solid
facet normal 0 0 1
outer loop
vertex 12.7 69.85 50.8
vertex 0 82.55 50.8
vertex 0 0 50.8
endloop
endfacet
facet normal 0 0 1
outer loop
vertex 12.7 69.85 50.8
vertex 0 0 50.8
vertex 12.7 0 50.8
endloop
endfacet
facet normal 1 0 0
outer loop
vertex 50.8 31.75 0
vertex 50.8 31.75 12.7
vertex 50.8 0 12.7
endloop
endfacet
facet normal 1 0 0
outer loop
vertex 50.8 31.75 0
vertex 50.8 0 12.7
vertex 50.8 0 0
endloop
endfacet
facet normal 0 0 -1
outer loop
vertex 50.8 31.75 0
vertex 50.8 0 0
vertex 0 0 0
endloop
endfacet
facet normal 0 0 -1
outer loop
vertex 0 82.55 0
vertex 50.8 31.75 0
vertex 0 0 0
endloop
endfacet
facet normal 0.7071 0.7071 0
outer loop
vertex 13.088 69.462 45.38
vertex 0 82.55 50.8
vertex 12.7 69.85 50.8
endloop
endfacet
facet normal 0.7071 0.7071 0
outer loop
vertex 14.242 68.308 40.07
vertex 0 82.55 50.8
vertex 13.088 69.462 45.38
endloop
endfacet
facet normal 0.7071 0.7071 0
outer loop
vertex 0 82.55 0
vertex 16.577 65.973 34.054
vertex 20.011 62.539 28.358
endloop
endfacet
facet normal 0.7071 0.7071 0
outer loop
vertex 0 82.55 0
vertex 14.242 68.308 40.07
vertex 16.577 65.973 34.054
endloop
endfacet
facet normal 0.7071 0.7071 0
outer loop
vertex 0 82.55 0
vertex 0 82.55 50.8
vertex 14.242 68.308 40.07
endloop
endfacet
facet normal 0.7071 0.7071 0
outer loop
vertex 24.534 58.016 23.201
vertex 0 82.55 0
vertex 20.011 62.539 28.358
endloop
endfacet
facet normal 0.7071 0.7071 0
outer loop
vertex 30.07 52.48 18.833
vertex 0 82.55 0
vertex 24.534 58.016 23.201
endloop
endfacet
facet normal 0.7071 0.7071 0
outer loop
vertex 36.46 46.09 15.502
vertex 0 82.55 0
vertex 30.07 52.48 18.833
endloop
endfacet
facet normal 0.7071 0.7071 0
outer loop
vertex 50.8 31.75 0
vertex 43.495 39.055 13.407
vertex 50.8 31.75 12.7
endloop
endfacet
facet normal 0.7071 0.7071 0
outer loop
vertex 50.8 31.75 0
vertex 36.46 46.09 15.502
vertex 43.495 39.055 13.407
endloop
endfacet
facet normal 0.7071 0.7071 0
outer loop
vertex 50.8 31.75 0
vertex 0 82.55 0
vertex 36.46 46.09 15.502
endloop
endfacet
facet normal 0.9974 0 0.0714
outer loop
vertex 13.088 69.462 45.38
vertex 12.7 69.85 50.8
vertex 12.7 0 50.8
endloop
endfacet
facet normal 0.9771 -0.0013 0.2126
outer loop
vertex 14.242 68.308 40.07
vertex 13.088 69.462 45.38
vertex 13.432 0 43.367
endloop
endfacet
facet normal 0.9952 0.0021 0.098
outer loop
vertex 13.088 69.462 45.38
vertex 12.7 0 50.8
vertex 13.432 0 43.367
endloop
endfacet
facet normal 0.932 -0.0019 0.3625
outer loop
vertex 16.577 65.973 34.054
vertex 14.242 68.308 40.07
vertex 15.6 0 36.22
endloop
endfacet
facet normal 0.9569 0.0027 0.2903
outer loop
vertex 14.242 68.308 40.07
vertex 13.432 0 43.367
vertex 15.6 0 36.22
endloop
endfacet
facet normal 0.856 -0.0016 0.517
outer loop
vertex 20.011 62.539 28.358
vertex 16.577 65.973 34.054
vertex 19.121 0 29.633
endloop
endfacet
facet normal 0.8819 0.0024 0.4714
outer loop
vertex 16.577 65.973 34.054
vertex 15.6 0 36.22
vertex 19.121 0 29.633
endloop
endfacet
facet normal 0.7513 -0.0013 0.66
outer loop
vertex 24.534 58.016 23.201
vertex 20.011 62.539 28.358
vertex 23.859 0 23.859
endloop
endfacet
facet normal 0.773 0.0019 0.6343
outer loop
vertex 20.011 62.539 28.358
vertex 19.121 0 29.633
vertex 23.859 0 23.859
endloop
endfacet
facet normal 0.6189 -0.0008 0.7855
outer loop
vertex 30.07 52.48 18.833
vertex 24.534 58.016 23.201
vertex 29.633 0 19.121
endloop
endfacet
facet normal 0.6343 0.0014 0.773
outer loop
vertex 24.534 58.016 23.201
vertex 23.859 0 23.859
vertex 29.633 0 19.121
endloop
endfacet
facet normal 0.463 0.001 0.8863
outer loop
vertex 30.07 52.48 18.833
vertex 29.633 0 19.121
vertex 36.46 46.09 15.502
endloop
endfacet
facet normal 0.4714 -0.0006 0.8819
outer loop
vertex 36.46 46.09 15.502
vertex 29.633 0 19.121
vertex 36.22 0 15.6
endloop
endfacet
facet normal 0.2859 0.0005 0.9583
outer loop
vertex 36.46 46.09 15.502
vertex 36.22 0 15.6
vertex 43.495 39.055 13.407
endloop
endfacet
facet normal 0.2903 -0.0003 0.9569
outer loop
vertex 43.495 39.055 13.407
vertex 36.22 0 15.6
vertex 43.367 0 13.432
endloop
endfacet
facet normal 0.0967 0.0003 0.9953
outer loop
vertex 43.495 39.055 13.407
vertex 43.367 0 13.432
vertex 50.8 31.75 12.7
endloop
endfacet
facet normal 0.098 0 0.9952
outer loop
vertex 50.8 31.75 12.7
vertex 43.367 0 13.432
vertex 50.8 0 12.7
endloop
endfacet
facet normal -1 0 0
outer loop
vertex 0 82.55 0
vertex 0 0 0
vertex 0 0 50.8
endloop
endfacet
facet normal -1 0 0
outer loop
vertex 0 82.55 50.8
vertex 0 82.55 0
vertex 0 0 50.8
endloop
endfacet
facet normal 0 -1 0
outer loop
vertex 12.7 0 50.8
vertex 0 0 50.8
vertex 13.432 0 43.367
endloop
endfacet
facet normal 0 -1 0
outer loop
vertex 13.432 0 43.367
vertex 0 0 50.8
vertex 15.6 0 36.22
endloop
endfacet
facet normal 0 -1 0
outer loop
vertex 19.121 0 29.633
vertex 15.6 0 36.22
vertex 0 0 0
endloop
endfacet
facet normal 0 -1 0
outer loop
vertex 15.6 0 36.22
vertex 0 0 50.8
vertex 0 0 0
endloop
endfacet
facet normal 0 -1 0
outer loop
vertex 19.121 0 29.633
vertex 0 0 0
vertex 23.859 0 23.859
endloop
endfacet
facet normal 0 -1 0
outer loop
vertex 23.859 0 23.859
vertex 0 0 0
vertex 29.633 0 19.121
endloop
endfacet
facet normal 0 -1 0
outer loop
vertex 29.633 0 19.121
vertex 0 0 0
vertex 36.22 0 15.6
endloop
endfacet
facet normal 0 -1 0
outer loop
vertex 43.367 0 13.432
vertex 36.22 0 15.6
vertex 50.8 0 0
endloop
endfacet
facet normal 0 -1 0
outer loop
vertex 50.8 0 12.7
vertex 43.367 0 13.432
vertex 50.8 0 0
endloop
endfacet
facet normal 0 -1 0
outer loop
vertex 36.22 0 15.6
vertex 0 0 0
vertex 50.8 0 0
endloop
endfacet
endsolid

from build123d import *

# Parameters (mm, degrees)
BOSS_EXTRUDE1_DEPTH     = 82.55
CUT_EXTRUDE1_DEPTH      = 110.433918417
CUT_EXTRUDE1_DEPTH_BACK = 110.433918417


with BuildPart() as part:
    # Sketch1 → Boss-Extrude1 (new body)
    with BuildSketch(Plane(origin=(0, 0, 0), x_dir=(1, 0, 0), z_dir=(0, 1, 0))):
        with BuildLine():
            Line((0, 0), (0, -50.8))
            Line((0, -50.8), (12.7, -50.8))
            ThreePointArc((12.7, -50.8), (23.859231637, -23.859231637), (50.8, -12.7))
            Line((50.8, -12.7), (50.8, 0))
            Line((50.8, 0), (0, 0))
        make_face()
    extrude(amount=BOSS_EXTRUDE1_DEPTH)

    # Sketch2 → Cut-Extrude1 (cut, two sides: drawn at the far end of the back side and taken through both)
    with BuildSketch(Plane.XY.offset(-CUT_EXTRUDE1_DEPTH_BACK)):
        Polygon((-144.148728282, 226.698728282), (0, 82.55), (50.8, 31.75), (194.948728282, -112.398728282), (483.246184846, 175.898728282), (144.148728282, 514.996184846), align=None)
    extrude(amount=CUT_EXTRUDE1_DEPTH + CUT_EXTRUDE1_DEPTH_BACK, mode=Mode.SUBTRACT)


solid = part.part
